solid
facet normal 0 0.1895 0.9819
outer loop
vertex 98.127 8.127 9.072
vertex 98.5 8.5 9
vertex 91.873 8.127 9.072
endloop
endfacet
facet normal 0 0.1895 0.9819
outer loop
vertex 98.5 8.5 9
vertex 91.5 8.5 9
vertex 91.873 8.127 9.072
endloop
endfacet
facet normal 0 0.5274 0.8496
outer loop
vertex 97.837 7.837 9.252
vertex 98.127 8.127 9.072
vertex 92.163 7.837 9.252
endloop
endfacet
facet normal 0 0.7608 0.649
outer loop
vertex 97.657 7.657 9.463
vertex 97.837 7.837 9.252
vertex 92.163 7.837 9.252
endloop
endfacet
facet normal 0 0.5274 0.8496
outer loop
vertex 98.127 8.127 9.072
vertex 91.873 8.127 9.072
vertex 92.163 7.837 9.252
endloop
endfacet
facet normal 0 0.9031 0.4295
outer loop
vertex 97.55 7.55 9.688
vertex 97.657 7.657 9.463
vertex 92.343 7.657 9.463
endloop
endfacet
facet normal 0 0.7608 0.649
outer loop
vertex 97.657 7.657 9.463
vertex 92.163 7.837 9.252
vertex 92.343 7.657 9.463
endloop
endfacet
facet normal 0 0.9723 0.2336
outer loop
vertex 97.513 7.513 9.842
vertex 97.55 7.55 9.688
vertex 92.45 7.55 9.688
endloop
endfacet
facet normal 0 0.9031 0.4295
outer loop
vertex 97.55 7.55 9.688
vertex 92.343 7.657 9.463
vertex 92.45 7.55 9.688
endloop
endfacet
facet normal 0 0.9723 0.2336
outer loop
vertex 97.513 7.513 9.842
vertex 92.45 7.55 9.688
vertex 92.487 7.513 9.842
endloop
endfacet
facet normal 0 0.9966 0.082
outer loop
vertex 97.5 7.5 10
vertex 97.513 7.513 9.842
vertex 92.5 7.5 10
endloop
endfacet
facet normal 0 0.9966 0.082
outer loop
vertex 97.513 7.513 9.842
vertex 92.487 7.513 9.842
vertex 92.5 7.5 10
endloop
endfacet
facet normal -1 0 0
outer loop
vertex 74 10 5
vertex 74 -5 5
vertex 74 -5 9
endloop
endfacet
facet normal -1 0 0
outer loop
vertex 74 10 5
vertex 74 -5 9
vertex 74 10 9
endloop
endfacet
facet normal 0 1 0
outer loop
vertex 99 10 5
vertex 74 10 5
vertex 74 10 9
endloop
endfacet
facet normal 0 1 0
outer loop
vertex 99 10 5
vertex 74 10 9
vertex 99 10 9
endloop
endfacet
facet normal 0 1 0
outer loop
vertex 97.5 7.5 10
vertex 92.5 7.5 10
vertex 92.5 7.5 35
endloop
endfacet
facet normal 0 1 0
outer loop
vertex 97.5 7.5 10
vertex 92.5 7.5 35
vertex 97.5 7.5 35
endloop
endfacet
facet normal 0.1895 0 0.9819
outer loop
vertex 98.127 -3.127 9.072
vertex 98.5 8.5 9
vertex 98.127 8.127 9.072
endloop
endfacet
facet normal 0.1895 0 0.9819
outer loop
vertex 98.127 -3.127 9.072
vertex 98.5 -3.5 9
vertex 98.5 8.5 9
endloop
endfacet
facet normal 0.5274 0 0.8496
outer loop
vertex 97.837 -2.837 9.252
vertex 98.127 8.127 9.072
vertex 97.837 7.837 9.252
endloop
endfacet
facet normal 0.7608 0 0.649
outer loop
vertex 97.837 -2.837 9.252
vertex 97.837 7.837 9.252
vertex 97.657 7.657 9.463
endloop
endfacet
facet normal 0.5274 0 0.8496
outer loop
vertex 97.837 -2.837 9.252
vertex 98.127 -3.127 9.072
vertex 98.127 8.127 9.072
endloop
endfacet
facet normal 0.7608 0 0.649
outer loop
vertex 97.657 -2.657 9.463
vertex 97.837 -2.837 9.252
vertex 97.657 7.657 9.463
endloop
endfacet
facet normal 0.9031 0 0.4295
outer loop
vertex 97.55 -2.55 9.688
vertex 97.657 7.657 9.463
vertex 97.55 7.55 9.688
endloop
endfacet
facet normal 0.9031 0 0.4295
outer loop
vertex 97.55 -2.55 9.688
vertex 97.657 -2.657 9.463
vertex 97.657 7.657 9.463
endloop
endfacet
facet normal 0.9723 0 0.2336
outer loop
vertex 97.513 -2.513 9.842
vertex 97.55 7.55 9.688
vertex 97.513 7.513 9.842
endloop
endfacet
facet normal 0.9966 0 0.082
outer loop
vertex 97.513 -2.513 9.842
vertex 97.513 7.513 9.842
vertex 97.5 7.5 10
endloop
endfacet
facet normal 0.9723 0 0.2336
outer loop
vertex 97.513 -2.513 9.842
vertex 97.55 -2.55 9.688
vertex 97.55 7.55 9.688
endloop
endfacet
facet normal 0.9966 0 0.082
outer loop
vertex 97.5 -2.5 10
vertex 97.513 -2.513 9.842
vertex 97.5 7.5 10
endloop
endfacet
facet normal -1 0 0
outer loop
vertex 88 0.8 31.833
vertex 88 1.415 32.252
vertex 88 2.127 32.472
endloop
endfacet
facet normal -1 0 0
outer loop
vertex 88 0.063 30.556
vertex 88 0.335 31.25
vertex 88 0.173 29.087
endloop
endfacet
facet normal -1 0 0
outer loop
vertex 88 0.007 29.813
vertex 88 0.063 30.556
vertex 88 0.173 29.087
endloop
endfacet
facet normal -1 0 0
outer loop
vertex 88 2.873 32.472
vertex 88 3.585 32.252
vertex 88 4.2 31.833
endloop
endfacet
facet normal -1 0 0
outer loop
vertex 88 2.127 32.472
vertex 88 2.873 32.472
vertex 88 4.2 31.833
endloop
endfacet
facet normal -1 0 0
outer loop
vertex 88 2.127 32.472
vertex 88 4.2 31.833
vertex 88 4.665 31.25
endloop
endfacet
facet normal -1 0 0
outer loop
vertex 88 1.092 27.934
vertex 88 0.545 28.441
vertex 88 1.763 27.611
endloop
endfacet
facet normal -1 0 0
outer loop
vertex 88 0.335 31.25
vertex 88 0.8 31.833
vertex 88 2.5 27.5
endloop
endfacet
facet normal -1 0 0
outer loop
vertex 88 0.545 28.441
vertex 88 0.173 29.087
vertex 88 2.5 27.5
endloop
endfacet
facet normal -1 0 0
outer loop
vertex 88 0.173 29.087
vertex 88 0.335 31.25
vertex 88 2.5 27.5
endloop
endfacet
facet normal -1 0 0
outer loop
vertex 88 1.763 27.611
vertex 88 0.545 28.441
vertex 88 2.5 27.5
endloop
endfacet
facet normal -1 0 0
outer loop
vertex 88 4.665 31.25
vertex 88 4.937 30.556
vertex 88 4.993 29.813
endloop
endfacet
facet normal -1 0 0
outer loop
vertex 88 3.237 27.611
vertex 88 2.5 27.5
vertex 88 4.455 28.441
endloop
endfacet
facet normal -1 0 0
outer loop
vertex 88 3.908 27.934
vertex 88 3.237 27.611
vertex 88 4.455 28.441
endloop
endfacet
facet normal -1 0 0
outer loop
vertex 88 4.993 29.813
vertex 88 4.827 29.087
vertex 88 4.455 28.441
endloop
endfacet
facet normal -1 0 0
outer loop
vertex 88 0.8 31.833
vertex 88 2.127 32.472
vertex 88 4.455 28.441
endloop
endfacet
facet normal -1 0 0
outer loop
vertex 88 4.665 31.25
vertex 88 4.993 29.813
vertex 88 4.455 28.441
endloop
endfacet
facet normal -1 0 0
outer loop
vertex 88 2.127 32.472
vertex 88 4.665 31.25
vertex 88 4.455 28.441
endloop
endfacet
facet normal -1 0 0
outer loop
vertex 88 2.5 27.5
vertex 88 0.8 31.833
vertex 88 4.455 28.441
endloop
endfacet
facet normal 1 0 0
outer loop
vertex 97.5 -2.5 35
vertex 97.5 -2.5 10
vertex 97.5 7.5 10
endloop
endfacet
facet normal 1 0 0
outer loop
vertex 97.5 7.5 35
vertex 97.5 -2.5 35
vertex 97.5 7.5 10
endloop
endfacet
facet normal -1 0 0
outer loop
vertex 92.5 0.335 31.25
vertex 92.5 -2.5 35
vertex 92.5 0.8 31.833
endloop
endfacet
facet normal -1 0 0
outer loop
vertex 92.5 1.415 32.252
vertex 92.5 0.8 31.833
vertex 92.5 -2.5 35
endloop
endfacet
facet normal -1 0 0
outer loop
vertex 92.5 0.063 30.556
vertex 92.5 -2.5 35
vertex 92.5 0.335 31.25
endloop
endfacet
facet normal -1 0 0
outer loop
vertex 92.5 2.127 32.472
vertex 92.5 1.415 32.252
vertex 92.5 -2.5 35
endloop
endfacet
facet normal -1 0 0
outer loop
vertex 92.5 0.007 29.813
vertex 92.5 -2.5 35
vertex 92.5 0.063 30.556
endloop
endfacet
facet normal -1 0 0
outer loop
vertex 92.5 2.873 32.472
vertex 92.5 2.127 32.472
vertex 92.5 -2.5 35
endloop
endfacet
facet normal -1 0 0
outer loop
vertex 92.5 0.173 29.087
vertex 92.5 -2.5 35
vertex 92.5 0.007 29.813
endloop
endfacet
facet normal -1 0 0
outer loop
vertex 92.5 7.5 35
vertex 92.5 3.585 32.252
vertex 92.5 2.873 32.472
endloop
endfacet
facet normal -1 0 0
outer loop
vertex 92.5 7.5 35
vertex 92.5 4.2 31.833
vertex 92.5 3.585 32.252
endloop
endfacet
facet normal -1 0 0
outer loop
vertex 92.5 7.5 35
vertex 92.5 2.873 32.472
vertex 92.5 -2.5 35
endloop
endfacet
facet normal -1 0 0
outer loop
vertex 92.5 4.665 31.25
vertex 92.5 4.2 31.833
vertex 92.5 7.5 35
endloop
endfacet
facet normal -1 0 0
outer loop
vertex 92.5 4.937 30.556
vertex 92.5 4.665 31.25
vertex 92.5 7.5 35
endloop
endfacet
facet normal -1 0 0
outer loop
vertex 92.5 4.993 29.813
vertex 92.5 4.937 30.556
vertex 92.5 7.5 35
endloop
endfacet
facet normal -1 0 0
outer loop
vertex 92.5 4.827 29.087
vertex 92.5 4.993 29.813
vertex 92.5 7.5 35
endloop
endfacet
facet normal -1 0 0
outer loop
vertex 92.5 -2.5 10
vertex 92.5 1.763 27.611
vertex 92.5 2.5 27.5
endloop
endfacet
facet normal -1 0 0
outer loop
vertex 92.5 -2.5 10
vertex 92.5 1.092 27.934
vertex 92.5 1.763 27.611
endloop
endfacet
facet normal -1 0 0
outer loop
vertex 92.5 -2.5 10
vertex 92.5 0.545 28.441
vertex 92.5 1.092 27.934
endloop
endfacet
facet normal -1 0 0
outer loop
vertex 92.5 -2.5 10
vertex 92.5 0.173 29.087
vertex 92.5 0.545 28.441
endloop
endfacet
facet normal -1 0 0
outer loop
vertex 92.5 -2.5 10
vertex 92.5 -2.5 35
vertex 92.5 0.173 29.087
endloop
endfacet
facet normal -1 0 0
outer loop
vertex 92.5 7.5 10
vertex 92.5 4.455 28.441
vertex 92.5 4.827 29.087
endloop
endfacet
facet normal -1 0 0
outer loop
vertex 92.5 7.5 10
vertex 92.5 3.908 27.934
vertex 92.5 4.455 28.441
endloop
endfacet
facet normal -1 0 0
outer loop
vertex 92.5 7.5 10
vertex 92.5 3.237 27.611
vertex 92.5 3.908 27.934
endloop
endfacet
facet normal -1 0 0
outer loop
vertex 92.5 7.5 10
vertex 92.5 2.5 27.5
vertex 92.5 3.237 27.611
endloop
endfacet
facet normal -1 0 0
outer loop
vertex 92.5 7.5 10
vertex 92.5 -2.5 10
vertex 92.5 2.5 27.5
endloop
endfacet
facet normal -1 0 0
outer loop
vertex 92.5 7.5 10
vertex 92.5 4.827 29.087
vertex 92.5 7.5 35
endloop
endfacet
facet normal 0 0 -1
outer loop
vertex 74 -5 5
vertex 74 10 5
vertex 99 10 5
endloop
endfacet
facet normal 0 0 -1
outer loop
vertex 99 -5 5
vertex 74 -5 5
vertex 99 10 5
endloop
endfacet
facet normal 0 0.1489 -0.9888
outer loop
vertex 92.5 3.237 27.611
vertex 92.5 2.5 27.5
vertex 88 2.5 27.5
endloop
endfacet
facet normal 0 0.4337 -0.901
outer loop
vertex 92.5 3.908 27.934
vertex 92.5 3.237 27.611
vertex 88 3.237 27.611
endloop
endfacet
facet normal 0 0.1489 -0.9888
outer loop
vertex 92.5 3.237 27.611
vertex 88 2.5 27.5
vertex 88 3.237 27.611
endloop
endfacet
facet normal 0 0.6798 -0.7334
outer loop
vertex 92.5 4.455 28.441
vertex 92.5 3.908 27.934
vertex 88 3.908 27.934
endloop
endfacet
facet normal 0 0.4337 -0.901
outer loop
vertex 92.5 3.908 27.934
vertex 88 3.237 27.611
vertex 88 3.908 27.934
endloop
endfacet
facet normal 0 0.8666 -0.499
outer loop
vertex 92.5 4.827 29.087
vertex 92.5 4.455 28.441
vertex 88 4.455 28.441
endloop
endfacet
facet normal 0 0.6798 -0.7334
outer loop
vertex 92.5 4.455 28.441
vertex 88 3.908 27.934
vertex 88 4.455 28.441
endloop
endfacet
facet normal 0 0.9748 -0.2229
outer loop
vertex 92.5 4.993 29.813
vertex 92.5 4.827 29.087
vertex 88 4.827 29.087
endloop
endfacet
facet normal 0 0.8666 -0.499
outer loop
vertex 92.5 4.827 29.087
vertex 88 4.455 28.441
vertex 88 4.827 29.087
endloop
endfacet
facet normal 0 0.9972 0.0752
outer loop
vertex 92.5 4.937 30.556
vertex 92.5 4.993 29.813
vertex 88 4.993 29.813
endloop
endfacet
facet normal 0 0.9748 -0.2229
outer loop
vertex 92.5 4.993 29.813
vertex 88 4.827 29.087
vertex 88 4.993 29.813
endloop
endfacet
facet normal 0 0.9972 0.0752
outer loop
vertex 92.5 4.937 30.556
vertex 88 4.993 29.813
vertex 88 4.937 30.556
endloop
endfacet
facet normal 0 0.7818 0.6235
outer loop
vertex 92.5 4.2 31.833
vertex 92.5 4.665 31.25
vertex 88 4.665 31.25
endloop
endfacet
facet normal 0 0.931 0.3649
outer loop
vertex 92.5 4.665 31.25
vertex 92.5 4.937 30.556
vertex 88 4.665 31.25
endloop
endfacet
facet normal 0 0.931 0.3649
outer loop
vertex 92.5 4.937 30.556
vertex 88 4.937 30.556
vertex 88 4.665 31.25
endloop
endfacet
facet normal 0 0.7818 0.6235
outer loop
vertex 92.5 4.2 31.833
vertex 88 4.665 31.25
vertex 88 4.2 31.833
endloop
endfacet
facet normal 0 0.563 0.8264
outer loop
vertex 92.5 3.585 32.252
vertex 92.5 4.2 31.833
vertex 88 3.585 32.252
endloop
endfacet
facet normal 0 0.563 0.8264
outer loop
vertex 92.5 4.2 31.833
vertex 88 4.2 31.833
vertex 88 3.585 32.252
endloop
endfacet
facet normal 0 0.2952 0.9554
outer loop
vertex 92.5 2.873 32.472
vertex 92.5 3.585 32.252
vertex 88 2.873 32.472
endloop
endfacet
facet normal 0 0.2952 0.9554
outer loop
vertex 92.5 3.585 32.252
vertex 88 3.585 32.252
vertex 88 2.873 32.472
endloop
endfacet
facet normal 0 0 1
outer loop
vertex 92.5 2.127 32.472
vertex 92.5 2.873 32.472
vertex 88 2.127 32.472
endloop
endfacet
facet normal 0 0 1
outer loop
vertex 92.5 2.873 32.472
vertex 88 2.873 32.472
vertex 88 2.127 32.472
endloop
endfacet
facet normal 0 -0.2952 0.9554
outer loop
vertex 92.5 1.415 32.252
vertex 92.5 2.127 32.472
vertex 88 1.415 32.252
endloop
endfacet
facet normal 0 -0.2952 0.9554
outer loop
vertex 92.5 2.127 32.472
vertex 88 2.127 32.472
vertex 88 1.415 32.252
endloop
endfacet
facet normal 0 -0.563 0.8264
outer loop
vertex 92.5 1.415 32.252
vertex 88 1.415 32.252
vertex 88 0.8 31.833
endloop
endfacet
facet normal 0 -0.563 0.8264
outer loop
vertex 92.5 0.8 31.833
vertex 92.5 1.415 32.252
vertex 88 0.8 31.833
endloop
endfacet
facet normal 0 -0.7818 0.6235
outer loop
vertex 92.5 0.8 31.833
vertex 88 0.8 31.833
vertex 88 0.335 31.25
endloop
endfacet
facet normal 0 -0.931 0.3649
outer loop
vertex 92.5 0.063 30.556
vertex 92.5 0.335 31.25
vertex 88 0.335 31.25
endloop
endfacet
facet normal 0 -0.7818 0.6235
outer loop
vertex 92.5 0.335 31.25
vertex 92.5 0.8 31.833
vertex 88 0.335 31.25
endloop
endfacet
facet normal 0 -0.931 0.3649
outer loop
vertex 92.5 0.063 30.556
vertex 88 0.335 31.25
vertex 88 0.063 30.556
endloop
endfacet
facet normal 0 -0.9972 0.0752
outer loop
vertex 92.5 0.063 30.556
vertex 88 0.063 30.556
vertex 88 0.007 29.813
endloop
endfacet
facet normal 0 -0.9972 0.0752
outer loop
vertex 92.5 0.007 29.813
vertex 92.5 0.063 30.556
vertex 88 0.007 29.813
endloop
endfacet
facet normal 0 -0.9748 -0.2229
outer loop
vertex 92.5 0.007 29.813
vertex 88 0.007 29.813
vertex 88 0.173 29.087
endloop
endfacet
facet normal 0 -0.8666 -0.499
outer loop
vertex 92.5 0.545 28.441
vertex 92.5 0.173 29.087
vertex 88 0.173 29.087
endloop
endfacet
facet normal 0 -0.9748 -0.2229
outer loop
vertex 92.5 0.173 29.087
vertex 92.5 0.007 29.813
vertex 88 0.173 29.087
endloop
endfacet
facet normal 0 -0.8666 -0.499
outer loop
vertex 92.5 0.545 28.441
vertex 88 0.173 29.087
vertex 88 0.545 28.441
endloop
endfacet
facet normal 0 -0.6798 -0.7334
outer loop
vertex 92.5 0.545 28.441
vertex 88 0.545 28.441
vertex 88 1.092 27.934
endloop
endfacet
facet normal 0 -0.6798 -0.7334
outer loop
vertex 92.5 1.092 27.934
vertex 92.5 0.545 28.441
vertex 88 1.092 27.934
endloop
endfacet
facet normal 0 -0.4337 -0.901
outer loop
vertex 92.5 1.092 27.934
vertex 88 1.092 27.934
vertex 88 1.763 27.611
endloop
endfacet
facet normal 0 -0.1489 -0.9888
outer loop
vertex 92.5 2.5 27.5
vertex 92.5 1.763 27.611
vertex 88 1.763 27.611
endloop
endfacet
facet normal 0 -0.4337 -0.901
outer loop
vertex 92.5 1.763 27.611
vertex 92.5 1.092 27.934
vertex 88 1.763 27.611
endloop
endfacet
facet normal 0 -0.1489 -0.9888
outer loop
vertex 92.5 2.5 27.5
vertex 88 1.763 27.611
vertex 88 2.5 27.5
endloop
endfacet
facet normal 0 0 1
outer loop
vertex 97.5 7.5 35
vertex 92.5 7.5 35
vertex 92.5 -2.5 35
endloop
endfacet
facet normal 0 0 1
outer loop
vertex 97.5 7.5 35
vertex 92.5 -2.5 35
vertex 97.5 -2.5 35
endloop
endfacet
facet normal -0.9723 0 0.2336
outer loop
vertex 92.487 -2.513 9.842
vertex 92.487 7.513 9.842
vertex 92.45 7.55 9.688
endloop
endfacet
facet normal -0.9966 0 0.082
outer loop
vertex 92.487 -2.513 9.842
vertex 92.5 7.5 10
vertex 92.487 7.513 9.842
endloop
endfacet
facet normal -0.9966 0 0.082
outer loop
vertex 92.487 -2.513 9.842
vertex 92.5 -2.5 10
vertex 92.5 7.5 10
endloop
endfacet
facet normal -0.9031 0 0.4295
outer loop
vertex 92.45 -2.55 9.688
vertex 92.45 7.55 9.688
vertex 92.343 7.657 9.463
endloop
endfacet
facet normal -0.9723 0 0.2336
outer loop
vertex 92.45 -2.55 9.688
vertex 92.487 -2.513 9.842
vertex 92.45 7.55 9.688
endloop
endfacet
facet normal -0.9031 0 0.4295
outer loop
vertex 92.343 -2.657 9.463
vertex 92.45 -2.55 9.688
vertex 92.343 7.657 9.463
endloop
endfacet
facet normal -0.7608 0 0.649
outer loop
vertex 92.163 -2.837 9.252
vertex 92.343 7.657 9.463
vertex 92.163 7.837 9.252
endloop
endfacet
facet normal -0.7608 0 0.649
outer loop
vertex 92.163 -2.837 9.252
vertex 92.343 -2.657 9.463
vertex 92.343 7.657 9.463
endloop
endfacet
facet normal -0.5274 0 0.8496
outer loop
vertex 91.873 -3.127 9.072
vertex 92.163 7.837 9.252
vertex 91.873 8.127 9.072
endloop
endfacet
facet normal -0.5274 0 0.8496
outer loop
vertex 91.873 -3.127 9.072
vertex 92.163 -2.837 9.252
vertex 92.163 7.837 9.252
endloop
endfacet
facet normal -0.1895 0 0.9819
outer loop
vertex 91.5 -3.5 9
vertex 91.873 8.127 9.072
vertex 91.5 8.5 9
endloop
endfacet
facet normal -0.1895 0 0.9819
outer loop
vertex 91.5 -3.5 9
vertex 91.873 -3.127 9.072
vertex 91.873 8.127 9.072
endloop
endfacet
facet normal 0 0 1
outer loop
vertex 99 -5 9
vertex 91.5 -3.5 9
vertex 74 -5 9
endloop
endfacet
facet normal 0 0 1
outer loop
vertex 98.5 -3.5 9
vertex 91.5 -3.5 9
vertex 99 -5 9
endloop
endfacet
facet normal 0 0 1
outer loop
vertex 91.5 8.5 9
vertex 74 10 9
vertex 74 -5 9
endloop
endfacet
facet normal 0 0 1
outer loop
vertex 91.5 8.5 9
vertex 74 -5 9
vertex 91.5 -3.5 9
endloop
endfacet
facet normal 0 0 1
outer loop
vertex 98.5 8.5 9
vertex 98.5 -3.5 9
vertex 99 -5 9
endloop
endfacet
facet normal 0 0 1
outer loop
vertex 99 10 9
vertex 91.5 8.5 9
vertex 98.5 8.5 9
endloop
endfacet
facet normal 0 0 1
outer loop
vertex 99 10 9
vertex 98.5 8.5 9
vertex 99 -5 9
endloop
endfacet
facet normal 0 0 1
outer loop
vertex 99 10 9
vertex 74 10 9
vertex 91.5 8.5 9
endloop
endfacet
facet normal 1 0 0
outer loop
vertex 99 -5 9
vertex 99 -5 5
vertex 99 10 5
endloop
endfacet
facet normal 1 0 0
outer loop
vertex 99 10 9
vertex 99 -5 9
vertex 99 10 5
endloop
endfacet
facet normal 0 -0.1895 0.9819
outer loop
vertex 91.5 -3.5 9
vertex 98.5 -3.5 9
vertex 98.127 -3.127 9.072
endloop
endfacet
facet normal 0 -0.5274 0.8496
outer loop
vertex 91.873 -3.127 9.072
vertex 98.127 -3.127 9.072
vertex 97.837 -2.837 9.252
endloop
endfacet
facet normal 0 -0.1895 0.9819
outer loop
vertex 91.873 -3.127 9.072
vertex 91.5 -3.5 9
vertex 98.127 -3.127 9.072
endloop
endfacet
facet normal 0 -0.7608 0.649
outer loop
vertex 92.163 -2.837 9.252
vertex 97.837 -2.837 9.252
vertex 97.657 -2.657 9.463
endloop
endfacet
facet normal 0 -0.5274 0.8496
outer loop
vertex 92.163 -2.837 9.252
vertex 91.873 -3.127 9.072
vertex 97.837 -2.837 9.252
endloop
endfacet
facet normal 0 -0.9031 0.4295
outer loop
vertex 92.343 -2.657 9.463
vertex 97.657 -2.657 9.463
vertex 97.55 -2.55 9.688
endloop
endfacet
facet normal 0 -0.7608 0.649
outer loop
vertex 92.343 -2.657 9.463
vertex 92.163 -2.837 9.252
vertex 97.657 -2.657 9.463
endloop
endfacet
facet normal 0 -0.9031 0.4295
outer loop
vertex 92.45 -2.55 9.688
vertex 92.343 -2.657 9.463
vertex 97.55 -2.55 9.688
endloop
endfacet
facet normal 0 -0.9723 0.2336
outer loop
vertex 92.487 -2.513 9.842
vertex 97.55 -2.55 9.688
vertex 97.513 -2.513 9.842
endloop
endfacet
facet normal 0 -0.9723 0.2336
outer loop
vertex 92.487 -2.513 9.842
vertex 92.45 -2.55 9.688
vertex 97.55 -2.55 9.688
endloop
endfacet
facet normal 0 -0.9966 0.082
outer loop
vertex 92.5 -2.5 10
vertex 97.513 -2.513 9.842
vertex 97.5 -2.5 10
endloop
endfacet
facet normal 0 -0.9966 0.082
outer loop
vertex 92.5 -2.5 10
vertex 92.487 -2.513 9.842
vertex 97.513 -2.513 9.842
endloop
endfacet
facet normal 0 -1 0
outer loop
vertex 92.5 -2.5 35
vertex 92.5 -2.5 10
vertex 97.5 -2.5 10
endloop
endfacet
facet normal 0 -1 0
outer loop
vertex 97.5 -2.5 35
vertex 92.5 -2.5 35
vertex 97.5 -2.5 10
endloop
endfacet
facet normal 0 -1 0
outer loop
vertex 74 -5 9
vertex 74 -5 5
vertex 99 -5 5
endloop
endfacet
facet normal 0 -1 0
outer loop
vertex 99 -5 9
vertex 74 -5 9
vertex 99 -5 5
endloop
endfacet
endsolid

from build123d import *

# Parameters (mm, degrees)
CYLINDER024_R     = 2.5
CYLINDER024_DEPTH = 5
BOX023_W          = 5
BOX023_H          = 10
BOX023_DEPTH      = 30
BOX024_W          = 25
BOX024_H          = 15
BOX024_DEPTH      = 4
FILLET_R          = 1


with BuildPart() as tapon_rotor:
    # Cylinder024 → Cylinder024 (new body)
    with BuildSketch(Plane(origin=(92, 2.5, 30), x_dir=(0, 0, -1), z_dir=(1, 0, 0))):
        Circle(CYLINDER024_R)
    extrude(amount=CYLINDER024_DEPTH)


with BuildPart() as tapon_soporte:
    # Box023 → Box023 (new body)
    with BuildSketch(Plane(origin=(96.5, -2.5, 5), x_dir=(1, 0, 0), z_dir=(0, 0, 1))):
        with Locations((2.5, 5)):
            Rectangle(BOX023_W, BOX023_H)
    extrude(amount=BOX023_DEPTH)

    # Fusion016: union tapon rotor
    add(tapon_rotor.part)


with BuildPart() as tapon_brazo_centro:
    # Box024 → Box024 (new body)
    with BuildSketch(Plane(origin=(78, -5, 5), x_dir=(1, 0, 0), z_dir=(0, 0, 1))):
        with Locations((12.5, 7.5)):
            Rectangle(BOX024_W, BOX024_H)
    extrude(amount=BOX024_DEPTH)

    # Fusion017: union tapon/soporte
    add(tapon_soporte.part)


with BuildPart() as tapon_brazo_centro_1:
    # Fusion017 placement: moved
    add(tapon_brazo_centro.part.moved(Location((-4, 0, 0))))

    # Fillet
    fillet_edges = [tapon_brazo_centro_1.edges().sort_by_distance(p)[0] for p in [
        (95, -2.5, 9),
        (97.5, 2.5, 9),
        (95, 7.5, 9),
        (92.5, 2.5, 9),
    ]]
    fillet(fillet_edges, radius=FILLET_R)


solid = tapon_brazo_centro_1.part
